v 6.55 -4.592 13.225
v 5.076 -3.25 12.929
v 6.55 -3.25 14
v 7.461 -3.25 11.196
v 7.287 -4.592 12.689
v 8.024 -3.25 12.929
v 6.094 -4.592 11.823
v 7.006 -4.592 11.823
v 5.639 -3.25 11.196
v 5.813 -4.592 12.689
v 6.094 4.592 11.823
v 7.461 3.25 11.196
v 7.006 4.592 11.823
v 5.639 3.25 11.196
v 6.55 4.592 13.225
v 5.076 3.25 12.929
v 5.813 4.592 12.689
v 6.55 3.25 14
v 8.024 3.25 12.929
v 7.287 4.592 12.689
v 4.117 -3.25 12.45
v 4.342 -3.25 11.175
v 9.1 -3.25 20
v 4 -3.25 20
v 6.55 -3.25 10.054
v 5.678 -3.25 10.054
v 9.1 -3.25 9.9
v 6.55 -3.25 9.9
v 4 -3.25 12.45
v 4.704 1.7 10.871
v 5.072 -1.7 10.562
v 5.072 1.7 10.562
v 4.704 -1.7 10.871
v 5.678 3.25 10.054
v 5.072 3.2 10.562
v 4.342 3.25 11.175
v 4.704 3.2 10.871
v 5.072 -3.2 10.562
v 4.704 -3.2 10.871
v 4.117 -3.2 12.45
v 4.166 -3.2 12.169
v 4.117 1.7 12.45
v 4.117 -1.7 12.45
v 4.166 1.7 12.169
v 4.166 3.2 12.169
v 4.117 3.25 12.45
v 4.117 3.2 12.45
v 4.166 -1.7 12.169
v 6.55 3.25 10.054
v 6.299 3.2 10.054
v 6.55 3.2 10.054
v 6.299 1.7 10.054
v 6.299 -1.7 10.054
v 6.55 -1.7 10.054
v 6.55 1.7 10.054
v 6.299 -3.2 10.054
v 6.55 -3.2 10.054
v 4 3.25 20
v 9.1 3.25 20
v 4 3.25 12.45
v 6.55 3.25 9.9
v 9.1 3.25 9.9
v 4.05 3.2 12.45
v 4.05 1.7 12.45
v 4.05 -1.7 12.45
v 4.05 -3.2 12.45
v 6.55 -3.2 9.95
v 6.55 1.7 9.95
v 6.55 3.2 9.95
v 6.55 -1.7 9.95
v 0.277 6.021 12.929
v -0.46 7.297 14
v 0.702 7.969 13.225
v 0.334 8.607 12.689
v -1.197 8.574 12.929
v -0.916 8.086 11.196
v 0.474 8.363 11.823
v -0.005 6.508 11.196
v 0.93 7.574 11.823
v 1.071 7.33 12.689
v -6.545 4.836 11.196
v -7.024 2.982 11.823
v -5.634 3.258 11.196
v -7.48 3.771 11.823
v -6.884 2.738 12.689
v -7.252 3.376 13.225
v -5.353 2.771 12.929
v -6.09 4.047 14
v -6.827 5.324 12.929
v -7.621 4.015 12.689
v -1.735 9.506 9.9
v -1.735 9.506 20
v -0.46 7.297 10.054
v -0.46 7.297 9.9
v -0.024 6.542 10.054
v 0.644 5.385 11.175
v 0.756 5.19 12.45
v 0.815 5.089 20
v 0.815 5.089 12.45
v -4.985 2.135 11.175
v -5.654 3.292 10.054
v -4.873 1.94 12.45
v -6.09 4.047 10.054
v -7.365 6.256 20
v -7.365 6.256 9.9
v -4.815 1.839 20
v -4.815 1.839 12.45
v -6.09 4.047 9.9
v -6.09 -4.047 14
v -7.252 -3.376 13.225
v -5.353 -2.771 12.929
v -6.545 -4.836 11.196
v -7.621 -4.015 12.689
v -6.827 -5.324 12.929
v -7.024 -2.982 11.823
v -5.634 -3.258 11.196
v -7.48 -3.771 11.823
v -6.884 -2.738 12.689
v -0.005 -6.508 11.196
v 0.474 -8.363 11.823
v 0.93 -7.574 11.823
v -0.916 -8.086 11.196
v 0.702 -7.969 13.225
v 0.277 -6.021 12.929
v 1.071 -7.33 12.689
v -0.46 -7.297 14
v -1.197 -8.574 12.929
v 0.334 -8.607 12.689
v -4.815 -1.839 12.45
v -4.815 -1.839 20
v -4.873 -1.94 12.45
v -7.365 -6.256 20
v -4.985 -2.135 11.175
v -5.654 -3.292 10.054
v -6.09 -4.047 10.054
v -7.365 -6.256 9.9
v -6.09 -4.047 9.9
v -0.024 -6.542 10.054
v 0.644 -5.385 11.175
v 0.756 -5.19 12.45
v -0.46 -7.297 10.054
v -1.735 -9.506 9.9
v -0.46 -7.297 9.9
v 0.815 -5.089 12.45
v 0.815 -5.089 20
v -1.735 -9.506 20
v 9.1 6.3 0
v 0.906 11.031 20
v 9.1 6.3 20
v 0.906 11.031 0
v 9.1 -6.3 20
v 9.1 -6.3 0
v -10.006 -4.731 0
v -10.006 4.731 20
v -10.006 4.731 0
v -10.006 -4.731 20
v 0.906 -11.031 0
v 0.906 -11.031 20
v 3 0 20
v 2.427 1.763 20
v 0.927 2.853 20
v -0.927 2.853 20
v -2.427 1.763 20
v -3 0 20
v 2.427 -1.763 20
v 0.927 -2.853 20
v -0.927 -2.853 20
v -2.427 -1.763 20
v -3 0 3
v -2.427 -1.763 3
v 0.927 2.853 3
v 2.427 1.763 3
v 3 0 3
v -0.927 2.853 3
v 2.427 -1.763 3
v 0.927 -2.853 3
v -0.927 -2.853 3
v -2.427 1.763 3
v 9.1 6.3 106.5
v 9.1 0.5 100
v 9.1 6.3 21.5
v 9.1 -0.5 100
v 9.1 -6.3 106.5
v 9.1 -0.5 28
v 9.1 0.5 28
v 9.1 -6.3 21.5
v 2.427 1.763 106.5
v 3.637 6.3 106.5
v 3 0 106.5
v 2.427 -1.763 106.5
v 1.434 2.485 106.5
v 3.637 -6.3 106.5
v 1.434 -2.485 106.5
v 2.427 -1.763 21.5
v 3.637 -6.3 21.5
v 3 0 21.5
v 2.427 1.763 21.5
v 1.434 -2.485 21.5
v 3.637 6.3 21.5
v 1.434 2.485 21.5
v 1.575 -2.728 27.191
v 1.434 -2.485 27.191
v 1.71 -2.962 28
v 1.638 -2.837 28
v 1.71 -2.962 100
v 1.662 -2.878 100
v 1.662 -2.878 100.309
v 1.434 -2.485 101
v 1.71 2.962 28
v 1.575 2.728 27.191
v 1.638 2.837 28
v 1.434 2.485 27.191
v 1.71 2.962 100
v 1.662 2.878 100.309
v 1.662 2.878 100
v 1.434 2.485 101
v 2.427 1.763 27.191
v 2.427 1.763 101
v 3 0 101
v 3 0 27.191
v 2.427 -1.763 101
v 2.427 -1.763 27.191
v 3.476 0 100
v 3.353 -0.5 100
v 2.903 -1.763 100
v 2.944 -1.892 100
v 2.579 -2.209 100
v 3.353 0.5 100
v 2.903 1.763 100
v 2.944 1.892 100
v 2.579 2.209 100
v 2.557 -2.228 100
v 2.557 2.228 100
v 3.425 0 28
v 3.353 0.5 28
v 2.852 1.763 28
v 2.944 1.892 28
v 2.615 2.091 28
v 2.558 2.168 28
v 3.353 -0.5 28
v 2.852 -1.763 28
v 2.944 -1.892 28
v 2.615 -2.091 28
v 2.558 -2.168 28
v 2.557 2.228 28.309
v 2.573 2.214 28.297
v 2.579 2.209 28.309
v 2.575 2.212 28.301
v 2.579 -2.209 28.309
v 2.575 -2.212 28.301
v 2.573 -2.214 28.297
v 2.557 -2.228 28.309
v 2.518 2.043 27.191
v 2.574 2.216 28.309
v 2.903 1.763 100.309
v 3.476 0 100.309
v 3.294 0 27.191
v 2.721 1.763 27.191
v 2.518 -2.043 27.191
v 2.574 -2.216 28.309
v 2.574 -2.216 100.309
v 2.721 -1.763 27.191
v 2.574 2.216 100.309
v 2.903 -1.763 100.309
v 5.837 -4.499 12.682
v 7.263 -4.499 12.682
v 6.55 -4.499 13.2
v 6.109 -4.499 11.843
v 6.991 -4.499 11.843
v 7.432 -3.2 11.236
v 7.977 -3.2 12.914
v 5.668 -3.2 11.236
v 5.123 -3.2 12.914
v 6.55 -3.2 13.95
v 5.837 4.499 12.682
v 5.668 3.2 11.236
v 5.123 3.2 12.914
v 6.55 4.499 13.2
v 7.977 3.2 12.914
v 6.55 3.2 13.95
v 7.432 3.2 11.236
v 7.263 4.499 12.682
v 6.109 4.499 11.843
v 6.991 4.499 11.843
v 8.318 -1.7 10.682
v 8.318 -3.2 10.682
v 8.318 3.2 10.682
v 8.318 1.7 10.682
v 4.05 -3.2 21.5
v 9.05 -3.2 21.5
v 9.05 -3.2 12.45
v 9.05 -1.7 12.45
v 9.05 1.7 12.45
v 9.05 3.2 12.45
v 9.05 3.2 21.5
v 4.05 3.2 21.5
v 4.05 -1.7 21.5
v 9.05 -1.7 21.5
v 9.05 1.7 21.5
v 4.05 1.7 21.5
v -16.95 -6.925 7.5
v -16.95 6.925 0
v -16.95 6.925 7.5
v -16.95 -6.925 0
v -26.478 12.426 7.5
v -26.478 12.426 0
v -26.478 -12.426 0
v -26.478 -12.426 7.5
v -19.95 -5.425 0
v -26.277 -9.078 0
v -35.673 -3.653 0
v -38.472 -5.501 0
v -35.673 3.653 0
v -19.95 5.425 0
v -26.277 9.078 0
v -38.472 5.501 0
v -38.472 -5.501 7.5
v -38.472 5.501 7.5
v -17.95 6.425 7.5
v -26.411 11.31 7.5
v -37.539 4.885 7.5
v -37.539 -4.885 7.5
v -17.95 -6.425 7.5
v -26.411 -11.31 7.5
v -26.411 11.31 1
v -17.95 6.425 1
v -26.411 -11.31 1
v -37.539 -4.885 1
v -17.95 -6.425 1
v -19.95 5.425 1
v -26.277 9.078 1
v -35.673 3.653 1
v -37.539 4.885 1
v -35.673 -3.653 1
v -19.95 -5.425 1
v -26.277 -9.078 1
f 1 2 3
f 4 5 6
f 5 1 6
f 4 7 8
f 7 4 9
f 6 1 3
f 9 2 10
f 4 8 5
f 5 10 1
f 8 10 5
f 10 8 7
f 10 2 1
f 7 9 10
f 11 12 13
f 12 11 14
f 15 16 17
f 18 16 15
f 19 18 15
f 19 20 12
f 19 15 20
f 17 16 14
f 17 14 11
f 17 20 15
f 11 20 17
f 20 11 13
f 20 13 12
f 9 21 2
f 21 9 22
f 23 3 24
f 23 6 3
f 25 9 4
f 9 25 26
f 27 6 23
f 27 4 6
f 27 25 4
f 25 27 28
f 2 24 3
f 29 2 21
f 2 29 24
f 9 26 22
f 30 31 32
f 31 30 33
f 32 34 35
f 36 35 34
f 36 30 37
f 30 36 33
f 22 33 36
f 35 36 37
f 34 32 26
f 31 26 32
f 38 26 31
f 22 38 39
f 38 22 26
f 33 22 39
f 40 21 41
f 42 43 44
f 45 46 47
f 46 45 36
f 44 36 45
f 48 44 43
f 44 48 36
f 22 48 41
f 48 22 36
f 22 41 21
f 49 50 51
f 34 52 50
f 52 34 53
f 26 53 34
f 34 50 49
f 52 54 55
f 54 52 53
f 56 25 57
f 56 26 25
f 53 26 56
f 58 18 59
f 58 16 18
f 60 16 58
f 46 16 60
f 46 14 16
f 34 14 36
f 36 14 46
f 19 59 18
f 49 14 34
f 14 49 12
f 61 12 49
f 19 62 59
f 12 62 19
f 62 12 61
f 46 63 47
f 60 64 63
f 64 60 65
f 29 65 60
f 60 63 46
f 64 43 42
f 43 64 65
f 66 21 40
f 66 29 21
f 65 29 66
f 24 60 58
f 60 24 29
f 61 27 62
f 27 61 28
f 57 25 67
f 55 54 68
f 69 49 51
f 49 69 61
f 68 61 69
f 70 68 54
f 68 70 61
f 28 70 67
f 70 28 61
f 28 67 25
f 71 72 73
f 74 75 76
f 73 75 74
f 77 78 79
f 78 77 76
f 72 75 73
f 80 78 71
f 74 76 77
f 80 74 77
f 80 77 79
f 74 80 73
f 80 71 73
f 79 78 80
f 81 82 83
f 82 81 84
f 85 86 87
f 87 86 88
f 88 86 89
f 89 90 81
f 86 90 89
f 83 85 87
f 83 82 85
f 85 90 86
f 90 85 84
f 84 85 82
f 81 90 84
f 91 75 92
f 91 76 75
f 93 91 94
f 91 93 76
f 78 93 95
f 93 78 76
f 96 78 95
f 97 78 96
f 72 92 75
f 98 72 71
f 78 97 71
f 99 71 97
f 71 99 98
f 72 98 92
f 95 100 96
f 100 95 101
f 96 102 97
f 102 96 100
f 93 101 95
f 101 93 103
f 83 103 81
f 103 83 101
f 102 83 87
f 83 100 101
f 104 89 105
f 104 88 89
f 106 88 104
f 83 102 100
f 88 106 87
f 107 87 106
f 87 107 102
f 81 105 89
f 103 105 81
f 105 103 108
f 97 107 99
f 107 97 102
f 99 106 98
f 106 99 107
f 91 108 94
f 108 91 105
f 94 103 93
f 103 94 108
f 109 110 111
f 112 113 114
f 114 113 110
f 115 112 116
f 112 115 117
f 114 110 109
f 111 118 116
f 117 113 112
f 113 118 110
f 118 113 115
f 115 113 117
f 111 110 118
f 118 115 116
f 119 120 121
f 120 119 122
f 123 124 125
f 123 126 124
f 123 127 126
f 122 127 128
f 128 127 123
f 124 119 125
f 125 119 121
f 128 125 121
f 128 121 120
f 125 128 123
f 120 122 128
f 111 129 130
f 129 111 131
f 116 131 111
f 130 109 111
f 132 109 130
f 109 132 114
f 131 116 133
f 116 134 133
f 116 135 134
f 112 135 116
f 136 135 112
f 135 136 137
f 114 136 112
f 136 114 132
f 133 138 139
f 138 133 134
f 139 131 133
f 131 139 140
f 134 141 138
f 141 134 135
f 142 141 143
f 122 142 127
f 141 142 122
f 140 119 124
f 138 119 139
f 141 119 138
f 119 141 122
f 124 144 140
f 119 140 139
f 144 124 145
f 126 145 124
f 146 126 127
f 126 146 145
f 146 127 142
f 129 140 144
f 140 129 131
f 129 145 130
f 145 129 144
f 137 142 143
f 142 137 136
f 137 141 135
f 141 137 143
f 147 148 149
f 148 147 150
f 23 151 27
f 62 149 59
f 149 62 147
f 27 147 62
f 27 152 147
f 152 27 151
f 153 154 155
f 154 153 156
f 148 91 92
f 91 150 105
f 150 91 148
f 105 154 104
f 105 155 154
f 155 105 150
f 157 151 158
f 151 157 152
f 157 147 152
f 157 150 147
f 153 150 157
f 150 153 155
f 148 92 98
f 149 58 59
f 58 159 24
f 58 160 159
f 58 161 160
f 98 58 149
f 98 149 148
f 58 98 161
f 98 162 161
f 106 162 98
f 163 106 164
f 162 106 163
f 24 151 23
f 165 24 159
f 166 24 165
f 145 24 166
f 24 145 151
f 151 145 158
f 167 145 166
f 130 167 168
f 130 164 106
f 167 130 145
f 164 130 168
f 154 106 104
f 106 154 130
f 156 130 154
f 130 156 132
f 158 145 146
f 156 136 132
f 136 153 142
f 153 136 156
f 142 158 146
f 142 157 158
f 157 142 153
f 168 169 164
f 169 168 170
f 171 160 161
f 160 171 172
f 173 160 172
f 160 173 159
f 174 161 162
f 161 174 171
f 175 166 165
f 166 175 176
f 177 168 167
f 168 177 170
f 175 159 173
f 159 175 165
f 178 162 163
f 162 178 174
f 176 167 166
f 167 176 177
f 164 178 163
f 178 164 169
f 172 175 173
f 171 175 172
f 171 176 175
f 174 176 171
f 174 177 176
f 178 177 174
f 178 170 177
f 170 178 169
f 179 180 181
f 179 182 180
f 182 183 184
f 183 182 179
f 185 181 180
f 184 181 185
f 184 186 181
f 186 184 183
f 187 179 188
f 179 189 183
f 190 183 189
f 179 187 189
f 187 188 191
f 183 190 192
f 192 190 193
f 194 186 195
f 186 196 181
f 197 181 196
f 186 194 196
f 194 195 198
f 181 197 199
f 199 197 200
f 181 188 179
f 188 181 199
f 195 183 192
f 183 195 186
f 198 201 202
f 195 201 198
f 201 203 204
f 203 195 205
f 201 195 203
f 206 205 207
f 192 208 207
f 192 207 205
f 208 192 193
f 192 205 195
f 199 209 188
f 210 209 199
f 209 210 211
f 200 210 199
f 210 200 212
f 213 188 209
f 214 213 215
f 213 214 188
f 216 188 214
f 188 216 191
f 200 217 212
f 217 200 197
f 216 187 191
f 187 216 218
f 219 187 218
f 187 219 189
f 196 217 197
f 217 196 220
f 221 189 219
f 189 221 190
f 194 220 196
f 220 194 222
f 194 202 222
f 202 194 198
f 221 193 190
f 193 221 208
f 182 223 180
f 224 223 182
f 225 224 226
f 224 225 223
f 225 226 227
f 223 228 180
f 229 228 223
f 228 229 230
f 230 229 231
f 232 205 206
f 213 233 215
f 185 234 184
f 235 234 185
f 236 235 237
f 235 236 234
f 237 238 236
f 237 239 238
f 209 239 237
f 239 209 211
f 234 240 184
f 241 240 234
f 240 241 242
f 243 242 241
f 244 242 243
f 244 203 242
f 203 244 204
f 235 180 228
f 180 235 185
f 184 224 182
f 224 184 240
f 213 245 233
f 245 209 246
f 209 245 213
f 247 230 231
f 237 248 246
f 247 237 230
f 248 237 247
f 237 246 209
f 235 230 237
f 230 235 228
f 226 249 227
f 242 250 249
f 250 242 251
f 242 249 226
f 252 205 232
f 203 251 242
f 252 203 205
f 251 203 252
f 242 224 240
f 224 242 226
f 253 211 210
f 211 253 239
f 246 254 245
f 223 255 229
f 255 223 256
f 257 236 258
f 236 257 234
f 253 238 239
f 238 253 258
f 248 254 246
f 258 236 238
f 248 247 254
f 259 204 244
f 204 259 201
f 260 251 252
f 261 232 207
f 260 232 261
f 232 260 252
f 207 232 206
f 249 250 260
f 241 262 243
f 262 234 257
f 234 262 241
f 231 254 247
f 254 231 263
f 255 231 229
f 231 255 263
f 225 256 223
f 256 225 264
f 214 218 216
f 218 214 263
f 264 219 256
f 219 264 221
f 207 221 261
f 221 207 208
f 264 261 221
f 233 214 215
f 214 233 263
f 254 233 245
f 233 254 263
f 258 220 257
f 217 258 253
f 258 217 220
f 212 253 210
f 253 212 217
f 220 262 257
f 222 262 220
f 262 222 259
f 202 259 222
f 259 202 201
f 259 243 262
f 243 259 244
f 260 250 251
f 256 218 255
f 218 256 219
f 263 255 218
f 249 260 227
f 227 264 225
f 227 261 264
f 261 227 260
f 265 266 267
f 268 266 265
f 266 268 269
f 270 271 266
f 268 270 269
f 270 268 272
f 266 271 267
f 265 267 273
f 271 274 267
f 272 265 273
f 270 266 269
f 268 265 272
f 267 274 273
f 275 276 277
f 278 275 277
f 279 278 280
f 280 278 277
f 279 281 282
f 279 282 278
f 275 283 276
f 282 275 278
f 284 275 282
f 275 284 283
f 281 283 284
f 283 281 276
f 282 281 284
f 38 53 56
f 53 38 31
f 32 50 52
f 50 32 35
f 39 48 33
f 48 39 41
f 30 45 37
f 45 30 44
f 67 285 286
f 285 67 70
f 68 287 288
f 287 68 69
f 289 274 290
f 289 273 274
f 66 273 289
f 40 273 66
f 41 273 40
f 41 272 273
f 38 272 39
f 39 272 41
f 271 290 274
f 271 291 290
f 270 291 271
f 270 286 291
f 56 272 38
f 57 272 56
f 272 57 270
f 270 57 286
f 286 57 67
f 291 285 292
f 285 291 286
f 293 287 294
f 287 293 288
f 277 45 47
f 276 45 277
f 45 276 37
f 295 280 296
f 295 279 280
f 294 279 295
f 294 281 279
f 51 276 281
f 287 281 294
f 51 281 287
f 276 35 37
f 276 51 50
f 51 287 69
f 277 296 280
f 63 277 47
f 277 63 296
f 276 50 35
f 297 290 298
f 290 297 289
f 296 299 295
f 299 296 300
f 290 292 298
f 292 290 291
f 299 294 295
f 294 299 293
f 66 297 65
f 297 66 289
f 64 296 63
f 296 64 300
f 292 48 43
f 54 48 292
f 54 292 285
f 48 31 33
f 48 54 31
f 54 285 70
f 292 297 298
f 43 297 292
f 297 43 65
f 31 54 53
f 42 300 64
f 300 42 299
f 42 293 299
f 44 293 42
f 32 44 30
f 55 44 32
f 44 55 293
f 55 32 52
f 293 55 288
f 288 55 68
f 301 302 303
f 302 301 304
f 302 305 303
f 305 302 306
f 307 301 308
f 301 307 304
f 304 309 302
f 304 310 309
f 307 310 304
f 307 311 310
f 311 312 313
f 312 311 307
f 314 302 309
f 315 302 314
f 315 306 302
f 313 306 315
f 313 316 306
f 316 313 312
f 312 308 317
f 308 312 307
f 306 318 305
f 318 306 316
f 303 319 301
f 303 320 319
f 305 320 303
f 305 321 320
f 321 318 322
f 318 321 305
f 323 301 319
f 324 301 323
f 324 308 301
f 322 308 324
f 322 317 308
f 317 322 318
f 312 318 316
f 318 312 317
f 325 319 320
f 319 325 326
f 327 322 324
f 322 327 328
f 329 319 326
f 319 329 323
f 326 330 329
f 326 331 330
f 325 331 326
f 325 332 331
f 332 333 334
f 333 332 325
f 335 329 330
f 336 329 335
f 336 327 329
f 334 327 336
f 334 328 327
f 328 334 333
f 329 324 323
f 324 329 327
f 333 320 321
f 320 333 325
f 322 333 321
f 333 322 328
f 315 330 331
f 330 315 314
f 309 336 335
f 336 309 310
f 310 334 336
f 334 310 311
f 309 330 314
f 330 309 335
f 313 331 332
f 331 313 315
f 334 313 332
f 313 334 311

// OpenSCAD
part = 0; //[0:All, 1:Base only, 2:Arm only, 3:Lid only]

/* [Jig settings] */

arrow_diameter = 6;//[2:0.1:30] 

//distance between the bottom of the base and arrow
arrow_offset = 3;//[0:0.1:100] 

base_height = 20;//[0:0.1:100]

hinge_width = 6.5;//[0:0.1:30]  

//thickness of the hinge extension attached to the bottom of the arm
hinge_thickness = 1.5;

//diameter of the hinge's circular part
hinge_diameter = 5.1;

//how deep into base is the hinge cutout
hinge_depth = 10.1;

//diameter of the sphere that connects two halves of the hinge together 
hinge_pin = 3.1;

//gap for the vane foot
arm_gap = 0.5;     

//distance between the top of the base and bottom of the arm
arm_offset = 1.5;

/* [Fletching] */

vane_length = 72;//[0:0.1:200] 

vane_width = 1;//[0:0.1:10] 

//how far from the end of arrow will the vane be
vane_offset = 25;//[0:0.1:200] 

//sets offset fletching in degrees
vane_turn = 0;// [-30:0.1:30]

//if true, helical fletching will be used
helical = 0;//[1:yes, 0:no]

//horizontal distance between the bottom and top corner of the helical vane
helical_adjust = 3.5; //[0:0.1:30]

helical_direction = 1;//[1:left, -1:right]

//taken from MCAD library
module ellipse(width, height) {
  scale([1, height/width, 1]) circle(r=width/2);
}

//
//Check out following video made by Eric Buijs
//for more information about bezier curves
//https://www.youtube.com/watch?v=jVPJetq0BZg
//

module bezier (p0, p1, p2, w)
{
    deltat = 0.02;
    points = [for (t=[0:deltat:1+deltat]) pow(1-t,2)*p0+2*(1-t)*t*p1+pow(t,2)*p2];

    for (i = [1 : len(points) - 1])
    {
        hull() 
        {
            translate(points[i-1]) circle(d=w);
            translate(points[i]) circle(d=w);
        }
    }
}

//
//Module that can create both parts of the hinge by changing holer value
//# hinge_diameter - diameter of the cylinder that forms a joint; also depth of the hinge
//# hinge_pin - diameter of the sphere that connects two parts of the hinge together 
//# holer - if true, outline of the joint will be created and can be later subtracted from another solid, creating opening for hinge itself
//## hole_lip - adds extra depth to the holer, only useful for preview
//
module hinge (hinge_width = 7, hinge_thickness = 1.5, hinge_diameter = 5, hinge_height = 8, hinge_pin = 2.4, holer = true)
{
    hole_lip = 1;
    translate([0,hinge_width/2,0]) rotate([90,-90,0]) mirror([0,1,0])
        difference()
        {
            union()
            {
                translate([0,0,hinge_width]) sphere(d=hinge_pin);
                sphere(d=hinge_pin);
                cylinder(hinge_width,d=hinge_diameter, true);     
                translate([hinge_height/2,0,hinge_width/2]) cube([hinge_height,hinge_diameter,hinge_width], true);
                if (holer)
                {
                    translate([-hinge_diameter/2,0,0]) 
                        cube([hinge_height + hinge_diameter/2, hinge_diameter/2 + hole_lip, hinge_width]);
                }
            }
            if (!holer)
            {
                translate([hinge_height/2 - hole_lip,0, hinge_width/2]) 
                    cube([hinge_height + hinge_diameter, hinge_diameter + hole_lip, hinge_width - 2*hinge_thickness], true);
            }
        }
}

//Functions that create console messages
module error_treshold (value_name, treshold_name, value, treshold)
{
    if (value == treshold) 
        echo(str("<font color='red'>", value_name," treshold (", treshold_name, " = ", treshold, ") reached!</font>"));
}
module info_treshold (value_name, treshold_name, treshold)
{
    echo(str("<font color='blue'>Current ", treshold_name, " for ", value_name, " is ", treshold, "</font>"));
}

//
//Creates helical vane
//# height - extrusion height
//# spread - horizontal distance between edges of the vane
//# direction - sign of the value determines left or right spin (+ left; - right)
//
module helical_vane (width = 1, length = 75, height = 10, spread = 4, direction = 1)
{
    direction = sign(direction);
    length = length - width;
    rotate([0,90,0])
        linear_extrude(height, center = false, twist = -direction*15, scale = 1)
            translate([-length/2,0,0])
                bezier([0,-direction*spread],[0.5*length,-direction*spread],[length,direction*spread],width);
}

//
//Creates basic shape of the jig's base
//
module base_mold (a = 8, radius = 15, height = 20)
{
    hull()
    { 
        for (i = [0:2]) 
        {
            rotate(a=[0,0,i*120]) translate([0,-a/2,0]) 
                cube([radius, a, height], false);
        }
    }
}

//
//All three main components of the jig are created here - arm, base and clamping lid
//# arrow_diameter - slightly bigger than the arrow itself (may vary depending on your printer)
//# arrow_offset - distance between the bottom of the base and arrow
//# base_height - height of the base
//# hinge_width - width of the hinge cutout on the base
//# hinge_thickness - thickness of the hinge extension attached to the bottom of the arm
//# hinge_diameter - diameter of the circular part of the hinge that forms a joint
//# hinge_depth - how deep into the base is the hinge cutout
//# hinge_pin - diameter of the sphere that connects two halves of the hinge together 
//# arm_gap - gap for the vane foot, so that tension during clamping is distributed evenly
//# arm_offset - distance between the top of the base and bottom of the arm
//# vane_length - length of the vane
//# vane_width - width of the vane
//# vane_offset - how far from the end of the arrow will the vane be
//# vane_turn - sets OFFSET fletching in degrees
//# helical - if true, HELICAL fletching will be used
//# helical_adjust - horizontal distance between the bottom and top corner of the HELICAL vane
//# helical_direction - sign of the value determines left or right spin (+ left; - right)
//
module jig (    part_select = 0,
                arrow_diameter = 6,
                arrow_offset = 3,
                base_height = 20,
                hinge_width = 6.5,
                hinge_thickness = 1.5, 
                hinge_diameter = 5,
                hinge_depth = 10,
                hinge_pin = 3,
                arm_gap = 0.5,         
                arm_offset = 1.5,
                vane_length = 75, 
                vane_width = 1.1, 
                vane_offset = 25,
                vane_turn = 0,
                helical = false,
                helical_adjust = 3.5,
                helical_direction = 1
             ) 
{
    //independent internal variables
    hinge_gap = 0.1;
    flag_showAll = part_select == 0 ? 0 : 1; 

    //input corrections and tresholds
    min_arrow_diameter = 2;
    arrow_diameter = abs(arrow_diameter) >= min_arrow_diameter ? abs(arrow_diameter) : min_arrow_diameter;

    min_base_height = 5;
    base_height = base_height >= min_base_height ? base_height : min_base_height;

    hinge_depth = abs(hinge_depth) <= base_height 
                    ? (abs(hinge_depth) >= min_base_height ? abs(hinge_depth) : min_base_height)
                    : base_height;
    
    min_hinge_diameter = 2;
    hinge_diameter = abs(hinge_diameter) <= hinge_depth 
                        ? (abs(hinge_diameter) >= min_hinge_diameter ? abs(hinge_diameter) : min_hinge_diameter)
                        : hinge_depth;

    min_hinge_thickness = 1;
    min_hinge_width = 2*min_hinge_thickness + hinge_gap;
    max_hinge_width = (3*arrow_diameter)/sqrt(3); //inscribed circle in equilateral triangle formula
    hinge_width     = abs(hinge_width) >= min_hinge_width 
                        ? (abs(hinge_width) <= max_hinge_width ? abs(hinge_width) : max_hinge_width) 
                        : min_hinge_width;

    max_hinge_thickness = (hinge_width-hinge_gap)/2;
    hinge_thickness = abs(hinge_thickness) >= min_hinge_thickness
                        ? (abs(hinge_thickness) <= max_hinge_thickness ? abs(hinge_thickness) : max_hinge_thickness) 
                        : min_hinge_thickness;

    max_hinge_pin = min(hinge_diameter, hinge_width - hinge_gap - 2*hinge_thickness);
    hinge_pin = abs(hinge_pin) <= max_hinge_pin ? abs(hinge_pin) : max_hinge_pin;

    arrow_offset = abs(arrow_offset) <= base_height ? abs(arrow_offset) : base_height;

    max_arm_gap = 1.5;
    arm_gap = abs(arm_gap) <= max_arm_gap ? arm_gap : max_arm_gap;

    vane_width = abs(vane_width);

    vane_length = abs(vane_length);

    arm_offset = abs(arm_offset);

    min_vane_offset = (base_height - arrow_offset) + arm_offset + 4;  
    vane_offset = vane_offset >= min_vane_offset ? vane_offset : min_vane_offset;

    //dependent internal variables
    base_diameter = arrow_diameter + 2*hinge_diameter + 2;
    base_radius = base_diameter/2;
    arrow_radius = arrow_diameter/2;
    hinge_radius = hinge_diameter/2;
    arm_height = vane_length + 2*(vane_offset-arm_offset-(base_height - arrow_offset));
    arm_width = hinge_width + hinge_pin + 3;

    //max vane turn limit calculation
    max_vane_turn = atan((((arrow_radius+arm_gap)*sqrt(3))/2 - vane_width/2)/(vane_length/2));
    vane_turn = abs(vane_turn) <= max_vane_turn ? vane_turn : sign(vane_turn)*max_vane_turn;


    //base
    if (part_select == 1 || part_select == 0)
    difference()
    {
        base_mold(a = arm_width, radius = base_radius, height = base_height);
        translate([0,0,arrow_offset]) cylinder(base_height,d=arrow_diameter, true);
        //hinge holer
        for (i = [0:2]) 
        {
            rotate(a=[0,0,i*120]) 
                translate([(base_radius) - hinge_radius, 0, base_height - hinge_depth + hinge_radius]) 
                        hinge (hinge_width, hinge_thickness, hinge_diameter, hinge_depth + arm_offset - hinge_radius, hinge_pin, true);
        }
    }

    //arm
    if (part_select == 2 || part_select == 0)
        rotate(flag_showAll*[0,90,0]) 
            translate(-flag_showAll*[base_radius,0,arm_height/2 + base_height + arm_offset])
    union()
    {
        difference()
        {
            translate([0,-arm_width/2,base_height + arm_offset])  
                cube([base_radius, arm_width, arm_height], false);
            //intersections with two remaining arms
            rotate(a = 120) translate([ -arm_width,0,base_height + arm_offset]) 
                cube([arm_width*2, arrow_diameter, arm_height], false);
            rotate(a = -120) mirror([0,1,0]) translate([ -arm_width,0,base_height + arm_offset]) 
                cube([arm_width*2, arrow_diameter, arm_height], false);
            //shaft hole
            translate([0,0,base_height]) 
                cylinder(arm_height + base_height,d=arrow_diameter, true);
            //vane
            if (helical)
            {
                //r - radius of arrow + gap for vane foot - correction
                //t - values from 0 to maximum spread (side of equilateral triangle in circumscribed cirle)
                //x - distance from center to arm based on t
                r = arrow_radius+arm_gap-0.35;
                t = helical_adjust < (r * sqrt(3)) ? helical_adjust : (r * sqrt(3));
                x = sqrt(pow(r,2) - pow(t,2)/4);
                
                translate([x,0, vane_length/2 + arrow_offset + vane_offset])
                    helical_vane(width = vane_width, 
                                    length = vane_length, 
                                    height = base_diameter, 
                                    spread = t/2 - vane_width/2,                            
                                    direction = helical_direction);
            }
            else
            {
                translate([base_radius/2,0, vane_length/2 + arrow_offset + vane_offset])
                    rotate([vane_turn,0,0])
                        cube([base_radius, vane_width, vane_length], true);
            }
            //vane foot cutout
            translate([0,0,arrow_offset + vane_offset]) cylinder(vane_length,r=arrow_radius + arm_gap, true);
            minkowski()
            {
                translate([0,0,arrow_offset + vane_offset]) cylinder(vane_length,r=arrow_radius, true);
                rotate_extrude(angle = 360, convexity = 2) 
                difference()
                {
                    rotate([0,0,90]) ellipse(4*arm_gap, 2*arm_gap);
                    translate([0,-2*arm_gap]) square(4*arm_gap, false);
                }
            }
        }
        translate([base_radius - hinge_radius, 0, base_height - hinge_depth + hinge_radius]) 
                            hinge(hinge_width - hinge_gap, hinge_thickness, hinge_diameter - hinge_gap, hinge_depth + arm_offset - hinge_radius, hinge_pin - hinge_gap, false);
    }

    //lid

    lid_thickness = 1;
    lid_lip = 2;
    lid_gap = 0.25;

    if (part_select == 3 || part_select == 0)
        translate((flag_showAll-1)*[3*base_radius,0,0]) 
    difference()
    {
        h = vane_offset-arm_offset-(base_height - arrow_offset) + lid_thickness;
        w = arm_width + lid_gap;
        r = base_radius + lid_gap;
        base_mold(a = w + lid_thickness, radius = r + lid_thickness, height = h);
        translate([0,0,lid_thickness] )base_mold(a = w, radius = r, height = h);
        base_mold(a = w - lid_lip, radius = r - lid_lip, height = h);
    }
}

print_part();

module print_part() {
	if (part == 0) {
		jig (
        part,
        arrow_diameter,
        arrow_offset,
        base_height,
        hinge_width,
        hinge_thickness,  
        hinge_diameter,
        hinge_depth,
        hinge_pin,
        arm_gap,         
        arm_offset,
        vane_length, 
        vane_width, 
        vane_offset,
        vane_turn,
        helical,
        helical_adjust,
        helical_direction
    );
	} else if (part == 1) {
		jig (
        part,
        arrow_diameter,
        arrow_offset,
        base_height,
        hinge_width,
        hinge_thickness,  
        hinge_diameter,
        hinge_depth,
        hinge_pin,
        arm_gap,         
        arm_offset,
        vane_length, 
        vane_width, 
        vane_offset,
        vane_turn,
        helical,
        helical_adjust,
        helical_direction
    );
	} else if (part == 2) {
		jig (
        part,
        arrow_diameter,
        arrow_offset,
        base_height,
        hinge_width,
        hinge_thickness,  
        hinge_diameter,
        hinge_depth,
        hinge_pin,
        arm_gap,         
        arm_offset,
        vane_length, 
        vane_width, 
        vane_offset,
        vane_turn,
        helical,
        helical_adjust,
        helical_direction
    );
	} else if (part == 3) {
		jig (
        part,
        arrow_diameter,
        arrow_offset,
        base_height,
        hinge_width,
        hinge_thickness,  
        hinge_diameter,
        hinge_depth,
        hinge_pin,
        arm_gap,         
        arm_offset,
        vane_length, 
        vane_width, 
        vane_offset,
        vane_turn,
        helical,
        helical_adjust,
        helical_direction
    );
	} else {
		jig (
        part,
        arrow_diameter,
        arrow_offset,
        base_height,
        hinge_width,
        hinge_thickness,  
        hinge_diameter,
        hinge_depth,
        hinge_pin,
        arm_gap,         
        arm_offset,
        vane_length, 
        vane_width, 
        vane_offset,
        vane_turn,
        helical,
        helical_adjust,
        helical_direction
    );
	}
}
